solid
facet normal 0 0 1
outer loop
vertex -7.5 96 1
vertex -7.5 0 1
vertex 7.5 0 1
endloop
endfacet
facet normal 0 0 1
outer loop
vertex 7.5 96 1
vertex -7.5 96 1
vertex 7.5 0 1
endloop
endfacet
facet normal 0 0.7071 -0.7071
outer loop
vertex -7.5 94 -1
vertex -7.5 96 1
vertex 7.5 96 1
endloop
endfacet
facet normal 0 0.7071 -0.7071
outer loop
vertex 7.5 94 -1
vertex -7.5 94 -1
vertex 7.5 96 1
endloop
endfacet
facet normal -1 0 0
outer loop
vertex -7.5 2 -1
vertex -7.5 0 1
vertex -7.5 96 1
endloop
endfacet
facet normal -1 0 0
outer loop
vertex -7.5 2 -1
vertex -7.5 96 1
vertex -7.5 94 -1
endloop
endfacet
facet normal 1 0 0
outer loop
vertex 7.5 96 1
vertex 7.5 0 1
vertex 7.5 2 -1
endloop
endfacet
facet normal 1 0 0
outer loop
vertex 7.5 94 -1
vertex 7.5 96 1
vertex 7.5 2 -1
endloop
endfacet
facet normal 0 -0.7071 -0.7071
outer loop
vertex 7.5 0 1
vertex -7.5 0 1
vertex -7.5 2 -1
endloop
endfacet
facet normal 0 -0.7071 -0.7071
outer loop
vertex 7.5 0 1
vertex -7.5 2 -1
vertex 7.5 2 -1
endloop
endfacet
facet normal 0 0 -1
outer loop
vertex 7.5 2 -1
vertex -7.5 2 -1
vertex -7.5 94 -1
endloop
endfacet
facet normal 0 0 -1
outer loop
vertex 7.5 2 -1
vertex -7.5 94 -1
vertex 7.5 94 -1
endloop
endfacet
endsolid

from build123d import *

# Parameters (mm, degrees)
SKETCH1_W           = 15
SKETCH1_H           = 2
BOSS_EXTRUDE1_DEPTH = 96
CHAMFER1_SIZE       = 2


with BuildPart() as part:
    # Sketch1 → Boss-Extrude1 (new body)
    with BuildSketch(Plane(origin=(0, 0, 0), x_dir=(1, 0, 0), z_dir=(0, 1, 0))):
        Rectangle(SKETCH1_W, SKETCH1_H)
    extrude(amount=BOSS_EXTRUDE1_DEPTH)

    # Chamfer1
    chamfer1_edges = [part.edges().sort_by_distance(p)[0] for p in [
        (0, 0, -1),
        (0, 96, -1),
    ]]
    chamfer(chamfer1_edges, length=CHAMFER1_SIZE - 0.0001)  # a hair under: the kernel refuses the full size


solid = part.part
